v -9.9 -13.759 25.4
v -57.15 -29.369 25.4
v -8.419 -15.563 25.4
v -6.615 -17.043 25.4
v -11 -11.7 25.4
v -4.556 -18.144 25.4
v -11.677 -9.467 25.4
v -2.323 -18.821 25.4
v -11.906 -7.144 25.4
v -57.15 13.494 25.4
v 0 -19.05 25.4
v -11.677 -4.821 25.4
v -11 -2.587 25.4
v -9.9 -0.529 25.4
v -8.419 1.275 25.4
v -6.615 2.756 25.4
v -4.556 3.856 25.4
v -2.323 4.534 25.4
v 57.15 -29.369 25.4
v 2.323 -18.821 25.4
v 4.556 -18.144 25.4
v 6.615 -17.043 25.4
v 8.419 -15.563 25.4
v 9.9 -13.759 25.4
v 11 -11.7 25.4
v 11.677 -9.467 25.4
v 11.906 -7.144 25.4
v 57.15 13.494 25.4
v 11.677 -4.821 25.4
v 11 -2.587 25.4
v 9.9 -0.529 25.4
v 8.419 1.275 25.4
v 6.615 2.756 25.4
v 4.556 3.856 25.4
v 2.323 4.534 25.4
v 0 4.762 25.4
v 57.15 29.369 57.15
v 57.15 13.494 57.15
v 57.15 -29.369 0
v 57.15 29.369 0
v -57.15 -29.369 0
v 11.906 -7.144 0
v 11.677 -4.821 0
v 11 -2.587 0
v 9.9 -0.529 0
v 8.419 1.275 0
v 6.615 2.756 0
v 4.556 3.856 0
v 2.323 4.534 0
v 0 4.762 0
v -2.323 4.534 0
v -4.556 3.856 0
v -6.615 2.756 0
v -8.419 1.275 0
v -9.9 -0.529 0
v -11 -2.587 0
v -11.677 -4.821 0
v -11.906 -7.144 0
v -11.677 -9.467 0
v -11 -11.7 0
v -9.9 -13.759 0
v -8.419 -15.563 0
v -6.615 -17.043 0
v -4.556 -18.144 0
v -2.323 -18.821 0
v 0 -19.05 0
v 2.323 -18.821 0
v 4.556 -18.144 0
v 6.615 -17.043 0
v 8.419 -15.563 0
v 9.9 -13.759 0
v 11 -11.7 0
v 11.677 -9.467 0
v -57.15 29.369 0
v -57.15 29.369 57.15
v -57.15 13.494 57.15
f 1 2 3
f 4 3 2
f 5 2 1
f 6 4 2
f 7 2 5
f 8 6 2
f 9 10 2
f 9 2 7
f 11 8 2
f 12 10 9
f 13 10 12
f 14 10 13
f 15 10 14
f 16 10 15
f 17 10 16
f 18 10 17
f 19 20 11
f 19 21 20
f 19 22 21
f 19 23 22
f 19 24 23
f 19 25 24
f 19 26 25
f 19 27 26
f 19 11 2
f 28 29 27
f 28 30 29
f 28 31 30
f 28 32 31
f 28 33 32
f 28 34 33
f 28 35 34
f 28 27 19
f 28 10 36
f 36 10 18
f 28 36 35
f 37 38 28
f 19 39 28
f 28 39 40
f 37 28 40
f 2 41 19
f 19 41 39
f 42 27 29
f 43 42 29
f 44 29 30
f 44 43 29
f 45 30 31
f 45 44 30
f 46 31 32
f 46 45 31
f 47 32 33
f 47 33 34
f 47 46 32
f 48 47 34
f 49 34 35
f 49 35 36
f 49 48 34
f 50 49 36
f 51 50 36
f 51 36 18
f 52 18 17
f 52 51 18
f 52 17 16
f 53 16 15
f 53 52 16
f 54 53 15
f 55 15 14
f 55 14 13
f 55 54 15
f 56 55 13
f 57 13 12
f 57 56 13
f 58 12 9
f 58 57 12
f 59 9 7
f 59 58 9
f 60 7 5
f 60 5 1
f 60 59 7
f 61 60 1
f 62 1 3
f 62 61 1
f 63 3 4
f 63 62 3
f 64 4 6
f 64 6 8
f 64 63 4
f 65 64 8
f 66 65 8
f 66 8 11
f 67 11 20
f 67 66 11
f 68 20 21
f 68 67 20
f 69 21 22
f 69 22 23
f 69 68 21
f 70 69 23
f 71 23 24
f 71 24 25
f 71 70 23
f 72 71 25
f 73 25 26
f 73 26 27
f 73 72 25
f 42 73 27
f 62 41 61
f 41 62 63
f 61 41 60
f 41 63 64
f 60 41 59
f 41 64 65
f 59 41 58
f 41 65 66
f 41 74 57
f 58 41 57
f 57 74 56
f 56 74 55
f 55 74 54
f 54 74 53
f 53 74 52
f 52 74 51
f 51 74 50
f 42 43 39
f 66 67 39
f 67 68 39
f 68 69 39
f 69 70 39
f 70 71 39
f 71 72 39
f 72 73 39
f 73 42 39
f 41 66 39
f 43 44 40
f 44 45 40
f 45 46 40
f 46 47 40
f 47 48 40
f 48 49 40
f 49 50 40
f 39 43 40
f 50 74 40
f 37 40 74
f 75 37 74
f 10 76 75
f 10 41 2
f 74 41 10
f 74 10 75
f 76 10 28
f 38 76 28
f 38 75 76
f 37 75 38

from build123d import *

# Parameters (mm, degrees)
F0_R     = 11.90625
F1_DEPTH = 25.4
F0_W     = 19.05
F0_H     = 15.875
F0_W_2   = 38.1
F2_DEPTH = 57.15


with BuildPart() as f1:
    # F0 (on Top) → F1 (new body)
    with BuildSketch(Plane.XY):
        Polygon((-57.15, -29.36875), (57.15, -29.36875), (57.15, 13.49375), (38.1, 13.49375), (0, 13.49375), (-38.1, 13.49375), (-57.15, 13.49375), align=None)
        with Locations((0, -7.14375)):
            Circle(F0_R, mode=Mode.SUBTRACT)
    extrude(amount=F1_DEPTH)

    # F0 (on Top) → F2 (join)
    with BuildSketch(Plane.XY):
        with Locations((-47.625, 21.43125)):
            Rectangle(F0_W, F0_H)
        with Locations((-19.05, 21.43125)):
            Rectangle(F0_W_2, F0_H)
        with Locations((19.05, 21.43125)):
            Rectangle(F0_W_2, F0_H)
        with Locations((47.625, 21.43125)):
            Rectangle(F0_W, F0_H)
    extrude(amount=F2_DEPTH)


solid = f1.part
